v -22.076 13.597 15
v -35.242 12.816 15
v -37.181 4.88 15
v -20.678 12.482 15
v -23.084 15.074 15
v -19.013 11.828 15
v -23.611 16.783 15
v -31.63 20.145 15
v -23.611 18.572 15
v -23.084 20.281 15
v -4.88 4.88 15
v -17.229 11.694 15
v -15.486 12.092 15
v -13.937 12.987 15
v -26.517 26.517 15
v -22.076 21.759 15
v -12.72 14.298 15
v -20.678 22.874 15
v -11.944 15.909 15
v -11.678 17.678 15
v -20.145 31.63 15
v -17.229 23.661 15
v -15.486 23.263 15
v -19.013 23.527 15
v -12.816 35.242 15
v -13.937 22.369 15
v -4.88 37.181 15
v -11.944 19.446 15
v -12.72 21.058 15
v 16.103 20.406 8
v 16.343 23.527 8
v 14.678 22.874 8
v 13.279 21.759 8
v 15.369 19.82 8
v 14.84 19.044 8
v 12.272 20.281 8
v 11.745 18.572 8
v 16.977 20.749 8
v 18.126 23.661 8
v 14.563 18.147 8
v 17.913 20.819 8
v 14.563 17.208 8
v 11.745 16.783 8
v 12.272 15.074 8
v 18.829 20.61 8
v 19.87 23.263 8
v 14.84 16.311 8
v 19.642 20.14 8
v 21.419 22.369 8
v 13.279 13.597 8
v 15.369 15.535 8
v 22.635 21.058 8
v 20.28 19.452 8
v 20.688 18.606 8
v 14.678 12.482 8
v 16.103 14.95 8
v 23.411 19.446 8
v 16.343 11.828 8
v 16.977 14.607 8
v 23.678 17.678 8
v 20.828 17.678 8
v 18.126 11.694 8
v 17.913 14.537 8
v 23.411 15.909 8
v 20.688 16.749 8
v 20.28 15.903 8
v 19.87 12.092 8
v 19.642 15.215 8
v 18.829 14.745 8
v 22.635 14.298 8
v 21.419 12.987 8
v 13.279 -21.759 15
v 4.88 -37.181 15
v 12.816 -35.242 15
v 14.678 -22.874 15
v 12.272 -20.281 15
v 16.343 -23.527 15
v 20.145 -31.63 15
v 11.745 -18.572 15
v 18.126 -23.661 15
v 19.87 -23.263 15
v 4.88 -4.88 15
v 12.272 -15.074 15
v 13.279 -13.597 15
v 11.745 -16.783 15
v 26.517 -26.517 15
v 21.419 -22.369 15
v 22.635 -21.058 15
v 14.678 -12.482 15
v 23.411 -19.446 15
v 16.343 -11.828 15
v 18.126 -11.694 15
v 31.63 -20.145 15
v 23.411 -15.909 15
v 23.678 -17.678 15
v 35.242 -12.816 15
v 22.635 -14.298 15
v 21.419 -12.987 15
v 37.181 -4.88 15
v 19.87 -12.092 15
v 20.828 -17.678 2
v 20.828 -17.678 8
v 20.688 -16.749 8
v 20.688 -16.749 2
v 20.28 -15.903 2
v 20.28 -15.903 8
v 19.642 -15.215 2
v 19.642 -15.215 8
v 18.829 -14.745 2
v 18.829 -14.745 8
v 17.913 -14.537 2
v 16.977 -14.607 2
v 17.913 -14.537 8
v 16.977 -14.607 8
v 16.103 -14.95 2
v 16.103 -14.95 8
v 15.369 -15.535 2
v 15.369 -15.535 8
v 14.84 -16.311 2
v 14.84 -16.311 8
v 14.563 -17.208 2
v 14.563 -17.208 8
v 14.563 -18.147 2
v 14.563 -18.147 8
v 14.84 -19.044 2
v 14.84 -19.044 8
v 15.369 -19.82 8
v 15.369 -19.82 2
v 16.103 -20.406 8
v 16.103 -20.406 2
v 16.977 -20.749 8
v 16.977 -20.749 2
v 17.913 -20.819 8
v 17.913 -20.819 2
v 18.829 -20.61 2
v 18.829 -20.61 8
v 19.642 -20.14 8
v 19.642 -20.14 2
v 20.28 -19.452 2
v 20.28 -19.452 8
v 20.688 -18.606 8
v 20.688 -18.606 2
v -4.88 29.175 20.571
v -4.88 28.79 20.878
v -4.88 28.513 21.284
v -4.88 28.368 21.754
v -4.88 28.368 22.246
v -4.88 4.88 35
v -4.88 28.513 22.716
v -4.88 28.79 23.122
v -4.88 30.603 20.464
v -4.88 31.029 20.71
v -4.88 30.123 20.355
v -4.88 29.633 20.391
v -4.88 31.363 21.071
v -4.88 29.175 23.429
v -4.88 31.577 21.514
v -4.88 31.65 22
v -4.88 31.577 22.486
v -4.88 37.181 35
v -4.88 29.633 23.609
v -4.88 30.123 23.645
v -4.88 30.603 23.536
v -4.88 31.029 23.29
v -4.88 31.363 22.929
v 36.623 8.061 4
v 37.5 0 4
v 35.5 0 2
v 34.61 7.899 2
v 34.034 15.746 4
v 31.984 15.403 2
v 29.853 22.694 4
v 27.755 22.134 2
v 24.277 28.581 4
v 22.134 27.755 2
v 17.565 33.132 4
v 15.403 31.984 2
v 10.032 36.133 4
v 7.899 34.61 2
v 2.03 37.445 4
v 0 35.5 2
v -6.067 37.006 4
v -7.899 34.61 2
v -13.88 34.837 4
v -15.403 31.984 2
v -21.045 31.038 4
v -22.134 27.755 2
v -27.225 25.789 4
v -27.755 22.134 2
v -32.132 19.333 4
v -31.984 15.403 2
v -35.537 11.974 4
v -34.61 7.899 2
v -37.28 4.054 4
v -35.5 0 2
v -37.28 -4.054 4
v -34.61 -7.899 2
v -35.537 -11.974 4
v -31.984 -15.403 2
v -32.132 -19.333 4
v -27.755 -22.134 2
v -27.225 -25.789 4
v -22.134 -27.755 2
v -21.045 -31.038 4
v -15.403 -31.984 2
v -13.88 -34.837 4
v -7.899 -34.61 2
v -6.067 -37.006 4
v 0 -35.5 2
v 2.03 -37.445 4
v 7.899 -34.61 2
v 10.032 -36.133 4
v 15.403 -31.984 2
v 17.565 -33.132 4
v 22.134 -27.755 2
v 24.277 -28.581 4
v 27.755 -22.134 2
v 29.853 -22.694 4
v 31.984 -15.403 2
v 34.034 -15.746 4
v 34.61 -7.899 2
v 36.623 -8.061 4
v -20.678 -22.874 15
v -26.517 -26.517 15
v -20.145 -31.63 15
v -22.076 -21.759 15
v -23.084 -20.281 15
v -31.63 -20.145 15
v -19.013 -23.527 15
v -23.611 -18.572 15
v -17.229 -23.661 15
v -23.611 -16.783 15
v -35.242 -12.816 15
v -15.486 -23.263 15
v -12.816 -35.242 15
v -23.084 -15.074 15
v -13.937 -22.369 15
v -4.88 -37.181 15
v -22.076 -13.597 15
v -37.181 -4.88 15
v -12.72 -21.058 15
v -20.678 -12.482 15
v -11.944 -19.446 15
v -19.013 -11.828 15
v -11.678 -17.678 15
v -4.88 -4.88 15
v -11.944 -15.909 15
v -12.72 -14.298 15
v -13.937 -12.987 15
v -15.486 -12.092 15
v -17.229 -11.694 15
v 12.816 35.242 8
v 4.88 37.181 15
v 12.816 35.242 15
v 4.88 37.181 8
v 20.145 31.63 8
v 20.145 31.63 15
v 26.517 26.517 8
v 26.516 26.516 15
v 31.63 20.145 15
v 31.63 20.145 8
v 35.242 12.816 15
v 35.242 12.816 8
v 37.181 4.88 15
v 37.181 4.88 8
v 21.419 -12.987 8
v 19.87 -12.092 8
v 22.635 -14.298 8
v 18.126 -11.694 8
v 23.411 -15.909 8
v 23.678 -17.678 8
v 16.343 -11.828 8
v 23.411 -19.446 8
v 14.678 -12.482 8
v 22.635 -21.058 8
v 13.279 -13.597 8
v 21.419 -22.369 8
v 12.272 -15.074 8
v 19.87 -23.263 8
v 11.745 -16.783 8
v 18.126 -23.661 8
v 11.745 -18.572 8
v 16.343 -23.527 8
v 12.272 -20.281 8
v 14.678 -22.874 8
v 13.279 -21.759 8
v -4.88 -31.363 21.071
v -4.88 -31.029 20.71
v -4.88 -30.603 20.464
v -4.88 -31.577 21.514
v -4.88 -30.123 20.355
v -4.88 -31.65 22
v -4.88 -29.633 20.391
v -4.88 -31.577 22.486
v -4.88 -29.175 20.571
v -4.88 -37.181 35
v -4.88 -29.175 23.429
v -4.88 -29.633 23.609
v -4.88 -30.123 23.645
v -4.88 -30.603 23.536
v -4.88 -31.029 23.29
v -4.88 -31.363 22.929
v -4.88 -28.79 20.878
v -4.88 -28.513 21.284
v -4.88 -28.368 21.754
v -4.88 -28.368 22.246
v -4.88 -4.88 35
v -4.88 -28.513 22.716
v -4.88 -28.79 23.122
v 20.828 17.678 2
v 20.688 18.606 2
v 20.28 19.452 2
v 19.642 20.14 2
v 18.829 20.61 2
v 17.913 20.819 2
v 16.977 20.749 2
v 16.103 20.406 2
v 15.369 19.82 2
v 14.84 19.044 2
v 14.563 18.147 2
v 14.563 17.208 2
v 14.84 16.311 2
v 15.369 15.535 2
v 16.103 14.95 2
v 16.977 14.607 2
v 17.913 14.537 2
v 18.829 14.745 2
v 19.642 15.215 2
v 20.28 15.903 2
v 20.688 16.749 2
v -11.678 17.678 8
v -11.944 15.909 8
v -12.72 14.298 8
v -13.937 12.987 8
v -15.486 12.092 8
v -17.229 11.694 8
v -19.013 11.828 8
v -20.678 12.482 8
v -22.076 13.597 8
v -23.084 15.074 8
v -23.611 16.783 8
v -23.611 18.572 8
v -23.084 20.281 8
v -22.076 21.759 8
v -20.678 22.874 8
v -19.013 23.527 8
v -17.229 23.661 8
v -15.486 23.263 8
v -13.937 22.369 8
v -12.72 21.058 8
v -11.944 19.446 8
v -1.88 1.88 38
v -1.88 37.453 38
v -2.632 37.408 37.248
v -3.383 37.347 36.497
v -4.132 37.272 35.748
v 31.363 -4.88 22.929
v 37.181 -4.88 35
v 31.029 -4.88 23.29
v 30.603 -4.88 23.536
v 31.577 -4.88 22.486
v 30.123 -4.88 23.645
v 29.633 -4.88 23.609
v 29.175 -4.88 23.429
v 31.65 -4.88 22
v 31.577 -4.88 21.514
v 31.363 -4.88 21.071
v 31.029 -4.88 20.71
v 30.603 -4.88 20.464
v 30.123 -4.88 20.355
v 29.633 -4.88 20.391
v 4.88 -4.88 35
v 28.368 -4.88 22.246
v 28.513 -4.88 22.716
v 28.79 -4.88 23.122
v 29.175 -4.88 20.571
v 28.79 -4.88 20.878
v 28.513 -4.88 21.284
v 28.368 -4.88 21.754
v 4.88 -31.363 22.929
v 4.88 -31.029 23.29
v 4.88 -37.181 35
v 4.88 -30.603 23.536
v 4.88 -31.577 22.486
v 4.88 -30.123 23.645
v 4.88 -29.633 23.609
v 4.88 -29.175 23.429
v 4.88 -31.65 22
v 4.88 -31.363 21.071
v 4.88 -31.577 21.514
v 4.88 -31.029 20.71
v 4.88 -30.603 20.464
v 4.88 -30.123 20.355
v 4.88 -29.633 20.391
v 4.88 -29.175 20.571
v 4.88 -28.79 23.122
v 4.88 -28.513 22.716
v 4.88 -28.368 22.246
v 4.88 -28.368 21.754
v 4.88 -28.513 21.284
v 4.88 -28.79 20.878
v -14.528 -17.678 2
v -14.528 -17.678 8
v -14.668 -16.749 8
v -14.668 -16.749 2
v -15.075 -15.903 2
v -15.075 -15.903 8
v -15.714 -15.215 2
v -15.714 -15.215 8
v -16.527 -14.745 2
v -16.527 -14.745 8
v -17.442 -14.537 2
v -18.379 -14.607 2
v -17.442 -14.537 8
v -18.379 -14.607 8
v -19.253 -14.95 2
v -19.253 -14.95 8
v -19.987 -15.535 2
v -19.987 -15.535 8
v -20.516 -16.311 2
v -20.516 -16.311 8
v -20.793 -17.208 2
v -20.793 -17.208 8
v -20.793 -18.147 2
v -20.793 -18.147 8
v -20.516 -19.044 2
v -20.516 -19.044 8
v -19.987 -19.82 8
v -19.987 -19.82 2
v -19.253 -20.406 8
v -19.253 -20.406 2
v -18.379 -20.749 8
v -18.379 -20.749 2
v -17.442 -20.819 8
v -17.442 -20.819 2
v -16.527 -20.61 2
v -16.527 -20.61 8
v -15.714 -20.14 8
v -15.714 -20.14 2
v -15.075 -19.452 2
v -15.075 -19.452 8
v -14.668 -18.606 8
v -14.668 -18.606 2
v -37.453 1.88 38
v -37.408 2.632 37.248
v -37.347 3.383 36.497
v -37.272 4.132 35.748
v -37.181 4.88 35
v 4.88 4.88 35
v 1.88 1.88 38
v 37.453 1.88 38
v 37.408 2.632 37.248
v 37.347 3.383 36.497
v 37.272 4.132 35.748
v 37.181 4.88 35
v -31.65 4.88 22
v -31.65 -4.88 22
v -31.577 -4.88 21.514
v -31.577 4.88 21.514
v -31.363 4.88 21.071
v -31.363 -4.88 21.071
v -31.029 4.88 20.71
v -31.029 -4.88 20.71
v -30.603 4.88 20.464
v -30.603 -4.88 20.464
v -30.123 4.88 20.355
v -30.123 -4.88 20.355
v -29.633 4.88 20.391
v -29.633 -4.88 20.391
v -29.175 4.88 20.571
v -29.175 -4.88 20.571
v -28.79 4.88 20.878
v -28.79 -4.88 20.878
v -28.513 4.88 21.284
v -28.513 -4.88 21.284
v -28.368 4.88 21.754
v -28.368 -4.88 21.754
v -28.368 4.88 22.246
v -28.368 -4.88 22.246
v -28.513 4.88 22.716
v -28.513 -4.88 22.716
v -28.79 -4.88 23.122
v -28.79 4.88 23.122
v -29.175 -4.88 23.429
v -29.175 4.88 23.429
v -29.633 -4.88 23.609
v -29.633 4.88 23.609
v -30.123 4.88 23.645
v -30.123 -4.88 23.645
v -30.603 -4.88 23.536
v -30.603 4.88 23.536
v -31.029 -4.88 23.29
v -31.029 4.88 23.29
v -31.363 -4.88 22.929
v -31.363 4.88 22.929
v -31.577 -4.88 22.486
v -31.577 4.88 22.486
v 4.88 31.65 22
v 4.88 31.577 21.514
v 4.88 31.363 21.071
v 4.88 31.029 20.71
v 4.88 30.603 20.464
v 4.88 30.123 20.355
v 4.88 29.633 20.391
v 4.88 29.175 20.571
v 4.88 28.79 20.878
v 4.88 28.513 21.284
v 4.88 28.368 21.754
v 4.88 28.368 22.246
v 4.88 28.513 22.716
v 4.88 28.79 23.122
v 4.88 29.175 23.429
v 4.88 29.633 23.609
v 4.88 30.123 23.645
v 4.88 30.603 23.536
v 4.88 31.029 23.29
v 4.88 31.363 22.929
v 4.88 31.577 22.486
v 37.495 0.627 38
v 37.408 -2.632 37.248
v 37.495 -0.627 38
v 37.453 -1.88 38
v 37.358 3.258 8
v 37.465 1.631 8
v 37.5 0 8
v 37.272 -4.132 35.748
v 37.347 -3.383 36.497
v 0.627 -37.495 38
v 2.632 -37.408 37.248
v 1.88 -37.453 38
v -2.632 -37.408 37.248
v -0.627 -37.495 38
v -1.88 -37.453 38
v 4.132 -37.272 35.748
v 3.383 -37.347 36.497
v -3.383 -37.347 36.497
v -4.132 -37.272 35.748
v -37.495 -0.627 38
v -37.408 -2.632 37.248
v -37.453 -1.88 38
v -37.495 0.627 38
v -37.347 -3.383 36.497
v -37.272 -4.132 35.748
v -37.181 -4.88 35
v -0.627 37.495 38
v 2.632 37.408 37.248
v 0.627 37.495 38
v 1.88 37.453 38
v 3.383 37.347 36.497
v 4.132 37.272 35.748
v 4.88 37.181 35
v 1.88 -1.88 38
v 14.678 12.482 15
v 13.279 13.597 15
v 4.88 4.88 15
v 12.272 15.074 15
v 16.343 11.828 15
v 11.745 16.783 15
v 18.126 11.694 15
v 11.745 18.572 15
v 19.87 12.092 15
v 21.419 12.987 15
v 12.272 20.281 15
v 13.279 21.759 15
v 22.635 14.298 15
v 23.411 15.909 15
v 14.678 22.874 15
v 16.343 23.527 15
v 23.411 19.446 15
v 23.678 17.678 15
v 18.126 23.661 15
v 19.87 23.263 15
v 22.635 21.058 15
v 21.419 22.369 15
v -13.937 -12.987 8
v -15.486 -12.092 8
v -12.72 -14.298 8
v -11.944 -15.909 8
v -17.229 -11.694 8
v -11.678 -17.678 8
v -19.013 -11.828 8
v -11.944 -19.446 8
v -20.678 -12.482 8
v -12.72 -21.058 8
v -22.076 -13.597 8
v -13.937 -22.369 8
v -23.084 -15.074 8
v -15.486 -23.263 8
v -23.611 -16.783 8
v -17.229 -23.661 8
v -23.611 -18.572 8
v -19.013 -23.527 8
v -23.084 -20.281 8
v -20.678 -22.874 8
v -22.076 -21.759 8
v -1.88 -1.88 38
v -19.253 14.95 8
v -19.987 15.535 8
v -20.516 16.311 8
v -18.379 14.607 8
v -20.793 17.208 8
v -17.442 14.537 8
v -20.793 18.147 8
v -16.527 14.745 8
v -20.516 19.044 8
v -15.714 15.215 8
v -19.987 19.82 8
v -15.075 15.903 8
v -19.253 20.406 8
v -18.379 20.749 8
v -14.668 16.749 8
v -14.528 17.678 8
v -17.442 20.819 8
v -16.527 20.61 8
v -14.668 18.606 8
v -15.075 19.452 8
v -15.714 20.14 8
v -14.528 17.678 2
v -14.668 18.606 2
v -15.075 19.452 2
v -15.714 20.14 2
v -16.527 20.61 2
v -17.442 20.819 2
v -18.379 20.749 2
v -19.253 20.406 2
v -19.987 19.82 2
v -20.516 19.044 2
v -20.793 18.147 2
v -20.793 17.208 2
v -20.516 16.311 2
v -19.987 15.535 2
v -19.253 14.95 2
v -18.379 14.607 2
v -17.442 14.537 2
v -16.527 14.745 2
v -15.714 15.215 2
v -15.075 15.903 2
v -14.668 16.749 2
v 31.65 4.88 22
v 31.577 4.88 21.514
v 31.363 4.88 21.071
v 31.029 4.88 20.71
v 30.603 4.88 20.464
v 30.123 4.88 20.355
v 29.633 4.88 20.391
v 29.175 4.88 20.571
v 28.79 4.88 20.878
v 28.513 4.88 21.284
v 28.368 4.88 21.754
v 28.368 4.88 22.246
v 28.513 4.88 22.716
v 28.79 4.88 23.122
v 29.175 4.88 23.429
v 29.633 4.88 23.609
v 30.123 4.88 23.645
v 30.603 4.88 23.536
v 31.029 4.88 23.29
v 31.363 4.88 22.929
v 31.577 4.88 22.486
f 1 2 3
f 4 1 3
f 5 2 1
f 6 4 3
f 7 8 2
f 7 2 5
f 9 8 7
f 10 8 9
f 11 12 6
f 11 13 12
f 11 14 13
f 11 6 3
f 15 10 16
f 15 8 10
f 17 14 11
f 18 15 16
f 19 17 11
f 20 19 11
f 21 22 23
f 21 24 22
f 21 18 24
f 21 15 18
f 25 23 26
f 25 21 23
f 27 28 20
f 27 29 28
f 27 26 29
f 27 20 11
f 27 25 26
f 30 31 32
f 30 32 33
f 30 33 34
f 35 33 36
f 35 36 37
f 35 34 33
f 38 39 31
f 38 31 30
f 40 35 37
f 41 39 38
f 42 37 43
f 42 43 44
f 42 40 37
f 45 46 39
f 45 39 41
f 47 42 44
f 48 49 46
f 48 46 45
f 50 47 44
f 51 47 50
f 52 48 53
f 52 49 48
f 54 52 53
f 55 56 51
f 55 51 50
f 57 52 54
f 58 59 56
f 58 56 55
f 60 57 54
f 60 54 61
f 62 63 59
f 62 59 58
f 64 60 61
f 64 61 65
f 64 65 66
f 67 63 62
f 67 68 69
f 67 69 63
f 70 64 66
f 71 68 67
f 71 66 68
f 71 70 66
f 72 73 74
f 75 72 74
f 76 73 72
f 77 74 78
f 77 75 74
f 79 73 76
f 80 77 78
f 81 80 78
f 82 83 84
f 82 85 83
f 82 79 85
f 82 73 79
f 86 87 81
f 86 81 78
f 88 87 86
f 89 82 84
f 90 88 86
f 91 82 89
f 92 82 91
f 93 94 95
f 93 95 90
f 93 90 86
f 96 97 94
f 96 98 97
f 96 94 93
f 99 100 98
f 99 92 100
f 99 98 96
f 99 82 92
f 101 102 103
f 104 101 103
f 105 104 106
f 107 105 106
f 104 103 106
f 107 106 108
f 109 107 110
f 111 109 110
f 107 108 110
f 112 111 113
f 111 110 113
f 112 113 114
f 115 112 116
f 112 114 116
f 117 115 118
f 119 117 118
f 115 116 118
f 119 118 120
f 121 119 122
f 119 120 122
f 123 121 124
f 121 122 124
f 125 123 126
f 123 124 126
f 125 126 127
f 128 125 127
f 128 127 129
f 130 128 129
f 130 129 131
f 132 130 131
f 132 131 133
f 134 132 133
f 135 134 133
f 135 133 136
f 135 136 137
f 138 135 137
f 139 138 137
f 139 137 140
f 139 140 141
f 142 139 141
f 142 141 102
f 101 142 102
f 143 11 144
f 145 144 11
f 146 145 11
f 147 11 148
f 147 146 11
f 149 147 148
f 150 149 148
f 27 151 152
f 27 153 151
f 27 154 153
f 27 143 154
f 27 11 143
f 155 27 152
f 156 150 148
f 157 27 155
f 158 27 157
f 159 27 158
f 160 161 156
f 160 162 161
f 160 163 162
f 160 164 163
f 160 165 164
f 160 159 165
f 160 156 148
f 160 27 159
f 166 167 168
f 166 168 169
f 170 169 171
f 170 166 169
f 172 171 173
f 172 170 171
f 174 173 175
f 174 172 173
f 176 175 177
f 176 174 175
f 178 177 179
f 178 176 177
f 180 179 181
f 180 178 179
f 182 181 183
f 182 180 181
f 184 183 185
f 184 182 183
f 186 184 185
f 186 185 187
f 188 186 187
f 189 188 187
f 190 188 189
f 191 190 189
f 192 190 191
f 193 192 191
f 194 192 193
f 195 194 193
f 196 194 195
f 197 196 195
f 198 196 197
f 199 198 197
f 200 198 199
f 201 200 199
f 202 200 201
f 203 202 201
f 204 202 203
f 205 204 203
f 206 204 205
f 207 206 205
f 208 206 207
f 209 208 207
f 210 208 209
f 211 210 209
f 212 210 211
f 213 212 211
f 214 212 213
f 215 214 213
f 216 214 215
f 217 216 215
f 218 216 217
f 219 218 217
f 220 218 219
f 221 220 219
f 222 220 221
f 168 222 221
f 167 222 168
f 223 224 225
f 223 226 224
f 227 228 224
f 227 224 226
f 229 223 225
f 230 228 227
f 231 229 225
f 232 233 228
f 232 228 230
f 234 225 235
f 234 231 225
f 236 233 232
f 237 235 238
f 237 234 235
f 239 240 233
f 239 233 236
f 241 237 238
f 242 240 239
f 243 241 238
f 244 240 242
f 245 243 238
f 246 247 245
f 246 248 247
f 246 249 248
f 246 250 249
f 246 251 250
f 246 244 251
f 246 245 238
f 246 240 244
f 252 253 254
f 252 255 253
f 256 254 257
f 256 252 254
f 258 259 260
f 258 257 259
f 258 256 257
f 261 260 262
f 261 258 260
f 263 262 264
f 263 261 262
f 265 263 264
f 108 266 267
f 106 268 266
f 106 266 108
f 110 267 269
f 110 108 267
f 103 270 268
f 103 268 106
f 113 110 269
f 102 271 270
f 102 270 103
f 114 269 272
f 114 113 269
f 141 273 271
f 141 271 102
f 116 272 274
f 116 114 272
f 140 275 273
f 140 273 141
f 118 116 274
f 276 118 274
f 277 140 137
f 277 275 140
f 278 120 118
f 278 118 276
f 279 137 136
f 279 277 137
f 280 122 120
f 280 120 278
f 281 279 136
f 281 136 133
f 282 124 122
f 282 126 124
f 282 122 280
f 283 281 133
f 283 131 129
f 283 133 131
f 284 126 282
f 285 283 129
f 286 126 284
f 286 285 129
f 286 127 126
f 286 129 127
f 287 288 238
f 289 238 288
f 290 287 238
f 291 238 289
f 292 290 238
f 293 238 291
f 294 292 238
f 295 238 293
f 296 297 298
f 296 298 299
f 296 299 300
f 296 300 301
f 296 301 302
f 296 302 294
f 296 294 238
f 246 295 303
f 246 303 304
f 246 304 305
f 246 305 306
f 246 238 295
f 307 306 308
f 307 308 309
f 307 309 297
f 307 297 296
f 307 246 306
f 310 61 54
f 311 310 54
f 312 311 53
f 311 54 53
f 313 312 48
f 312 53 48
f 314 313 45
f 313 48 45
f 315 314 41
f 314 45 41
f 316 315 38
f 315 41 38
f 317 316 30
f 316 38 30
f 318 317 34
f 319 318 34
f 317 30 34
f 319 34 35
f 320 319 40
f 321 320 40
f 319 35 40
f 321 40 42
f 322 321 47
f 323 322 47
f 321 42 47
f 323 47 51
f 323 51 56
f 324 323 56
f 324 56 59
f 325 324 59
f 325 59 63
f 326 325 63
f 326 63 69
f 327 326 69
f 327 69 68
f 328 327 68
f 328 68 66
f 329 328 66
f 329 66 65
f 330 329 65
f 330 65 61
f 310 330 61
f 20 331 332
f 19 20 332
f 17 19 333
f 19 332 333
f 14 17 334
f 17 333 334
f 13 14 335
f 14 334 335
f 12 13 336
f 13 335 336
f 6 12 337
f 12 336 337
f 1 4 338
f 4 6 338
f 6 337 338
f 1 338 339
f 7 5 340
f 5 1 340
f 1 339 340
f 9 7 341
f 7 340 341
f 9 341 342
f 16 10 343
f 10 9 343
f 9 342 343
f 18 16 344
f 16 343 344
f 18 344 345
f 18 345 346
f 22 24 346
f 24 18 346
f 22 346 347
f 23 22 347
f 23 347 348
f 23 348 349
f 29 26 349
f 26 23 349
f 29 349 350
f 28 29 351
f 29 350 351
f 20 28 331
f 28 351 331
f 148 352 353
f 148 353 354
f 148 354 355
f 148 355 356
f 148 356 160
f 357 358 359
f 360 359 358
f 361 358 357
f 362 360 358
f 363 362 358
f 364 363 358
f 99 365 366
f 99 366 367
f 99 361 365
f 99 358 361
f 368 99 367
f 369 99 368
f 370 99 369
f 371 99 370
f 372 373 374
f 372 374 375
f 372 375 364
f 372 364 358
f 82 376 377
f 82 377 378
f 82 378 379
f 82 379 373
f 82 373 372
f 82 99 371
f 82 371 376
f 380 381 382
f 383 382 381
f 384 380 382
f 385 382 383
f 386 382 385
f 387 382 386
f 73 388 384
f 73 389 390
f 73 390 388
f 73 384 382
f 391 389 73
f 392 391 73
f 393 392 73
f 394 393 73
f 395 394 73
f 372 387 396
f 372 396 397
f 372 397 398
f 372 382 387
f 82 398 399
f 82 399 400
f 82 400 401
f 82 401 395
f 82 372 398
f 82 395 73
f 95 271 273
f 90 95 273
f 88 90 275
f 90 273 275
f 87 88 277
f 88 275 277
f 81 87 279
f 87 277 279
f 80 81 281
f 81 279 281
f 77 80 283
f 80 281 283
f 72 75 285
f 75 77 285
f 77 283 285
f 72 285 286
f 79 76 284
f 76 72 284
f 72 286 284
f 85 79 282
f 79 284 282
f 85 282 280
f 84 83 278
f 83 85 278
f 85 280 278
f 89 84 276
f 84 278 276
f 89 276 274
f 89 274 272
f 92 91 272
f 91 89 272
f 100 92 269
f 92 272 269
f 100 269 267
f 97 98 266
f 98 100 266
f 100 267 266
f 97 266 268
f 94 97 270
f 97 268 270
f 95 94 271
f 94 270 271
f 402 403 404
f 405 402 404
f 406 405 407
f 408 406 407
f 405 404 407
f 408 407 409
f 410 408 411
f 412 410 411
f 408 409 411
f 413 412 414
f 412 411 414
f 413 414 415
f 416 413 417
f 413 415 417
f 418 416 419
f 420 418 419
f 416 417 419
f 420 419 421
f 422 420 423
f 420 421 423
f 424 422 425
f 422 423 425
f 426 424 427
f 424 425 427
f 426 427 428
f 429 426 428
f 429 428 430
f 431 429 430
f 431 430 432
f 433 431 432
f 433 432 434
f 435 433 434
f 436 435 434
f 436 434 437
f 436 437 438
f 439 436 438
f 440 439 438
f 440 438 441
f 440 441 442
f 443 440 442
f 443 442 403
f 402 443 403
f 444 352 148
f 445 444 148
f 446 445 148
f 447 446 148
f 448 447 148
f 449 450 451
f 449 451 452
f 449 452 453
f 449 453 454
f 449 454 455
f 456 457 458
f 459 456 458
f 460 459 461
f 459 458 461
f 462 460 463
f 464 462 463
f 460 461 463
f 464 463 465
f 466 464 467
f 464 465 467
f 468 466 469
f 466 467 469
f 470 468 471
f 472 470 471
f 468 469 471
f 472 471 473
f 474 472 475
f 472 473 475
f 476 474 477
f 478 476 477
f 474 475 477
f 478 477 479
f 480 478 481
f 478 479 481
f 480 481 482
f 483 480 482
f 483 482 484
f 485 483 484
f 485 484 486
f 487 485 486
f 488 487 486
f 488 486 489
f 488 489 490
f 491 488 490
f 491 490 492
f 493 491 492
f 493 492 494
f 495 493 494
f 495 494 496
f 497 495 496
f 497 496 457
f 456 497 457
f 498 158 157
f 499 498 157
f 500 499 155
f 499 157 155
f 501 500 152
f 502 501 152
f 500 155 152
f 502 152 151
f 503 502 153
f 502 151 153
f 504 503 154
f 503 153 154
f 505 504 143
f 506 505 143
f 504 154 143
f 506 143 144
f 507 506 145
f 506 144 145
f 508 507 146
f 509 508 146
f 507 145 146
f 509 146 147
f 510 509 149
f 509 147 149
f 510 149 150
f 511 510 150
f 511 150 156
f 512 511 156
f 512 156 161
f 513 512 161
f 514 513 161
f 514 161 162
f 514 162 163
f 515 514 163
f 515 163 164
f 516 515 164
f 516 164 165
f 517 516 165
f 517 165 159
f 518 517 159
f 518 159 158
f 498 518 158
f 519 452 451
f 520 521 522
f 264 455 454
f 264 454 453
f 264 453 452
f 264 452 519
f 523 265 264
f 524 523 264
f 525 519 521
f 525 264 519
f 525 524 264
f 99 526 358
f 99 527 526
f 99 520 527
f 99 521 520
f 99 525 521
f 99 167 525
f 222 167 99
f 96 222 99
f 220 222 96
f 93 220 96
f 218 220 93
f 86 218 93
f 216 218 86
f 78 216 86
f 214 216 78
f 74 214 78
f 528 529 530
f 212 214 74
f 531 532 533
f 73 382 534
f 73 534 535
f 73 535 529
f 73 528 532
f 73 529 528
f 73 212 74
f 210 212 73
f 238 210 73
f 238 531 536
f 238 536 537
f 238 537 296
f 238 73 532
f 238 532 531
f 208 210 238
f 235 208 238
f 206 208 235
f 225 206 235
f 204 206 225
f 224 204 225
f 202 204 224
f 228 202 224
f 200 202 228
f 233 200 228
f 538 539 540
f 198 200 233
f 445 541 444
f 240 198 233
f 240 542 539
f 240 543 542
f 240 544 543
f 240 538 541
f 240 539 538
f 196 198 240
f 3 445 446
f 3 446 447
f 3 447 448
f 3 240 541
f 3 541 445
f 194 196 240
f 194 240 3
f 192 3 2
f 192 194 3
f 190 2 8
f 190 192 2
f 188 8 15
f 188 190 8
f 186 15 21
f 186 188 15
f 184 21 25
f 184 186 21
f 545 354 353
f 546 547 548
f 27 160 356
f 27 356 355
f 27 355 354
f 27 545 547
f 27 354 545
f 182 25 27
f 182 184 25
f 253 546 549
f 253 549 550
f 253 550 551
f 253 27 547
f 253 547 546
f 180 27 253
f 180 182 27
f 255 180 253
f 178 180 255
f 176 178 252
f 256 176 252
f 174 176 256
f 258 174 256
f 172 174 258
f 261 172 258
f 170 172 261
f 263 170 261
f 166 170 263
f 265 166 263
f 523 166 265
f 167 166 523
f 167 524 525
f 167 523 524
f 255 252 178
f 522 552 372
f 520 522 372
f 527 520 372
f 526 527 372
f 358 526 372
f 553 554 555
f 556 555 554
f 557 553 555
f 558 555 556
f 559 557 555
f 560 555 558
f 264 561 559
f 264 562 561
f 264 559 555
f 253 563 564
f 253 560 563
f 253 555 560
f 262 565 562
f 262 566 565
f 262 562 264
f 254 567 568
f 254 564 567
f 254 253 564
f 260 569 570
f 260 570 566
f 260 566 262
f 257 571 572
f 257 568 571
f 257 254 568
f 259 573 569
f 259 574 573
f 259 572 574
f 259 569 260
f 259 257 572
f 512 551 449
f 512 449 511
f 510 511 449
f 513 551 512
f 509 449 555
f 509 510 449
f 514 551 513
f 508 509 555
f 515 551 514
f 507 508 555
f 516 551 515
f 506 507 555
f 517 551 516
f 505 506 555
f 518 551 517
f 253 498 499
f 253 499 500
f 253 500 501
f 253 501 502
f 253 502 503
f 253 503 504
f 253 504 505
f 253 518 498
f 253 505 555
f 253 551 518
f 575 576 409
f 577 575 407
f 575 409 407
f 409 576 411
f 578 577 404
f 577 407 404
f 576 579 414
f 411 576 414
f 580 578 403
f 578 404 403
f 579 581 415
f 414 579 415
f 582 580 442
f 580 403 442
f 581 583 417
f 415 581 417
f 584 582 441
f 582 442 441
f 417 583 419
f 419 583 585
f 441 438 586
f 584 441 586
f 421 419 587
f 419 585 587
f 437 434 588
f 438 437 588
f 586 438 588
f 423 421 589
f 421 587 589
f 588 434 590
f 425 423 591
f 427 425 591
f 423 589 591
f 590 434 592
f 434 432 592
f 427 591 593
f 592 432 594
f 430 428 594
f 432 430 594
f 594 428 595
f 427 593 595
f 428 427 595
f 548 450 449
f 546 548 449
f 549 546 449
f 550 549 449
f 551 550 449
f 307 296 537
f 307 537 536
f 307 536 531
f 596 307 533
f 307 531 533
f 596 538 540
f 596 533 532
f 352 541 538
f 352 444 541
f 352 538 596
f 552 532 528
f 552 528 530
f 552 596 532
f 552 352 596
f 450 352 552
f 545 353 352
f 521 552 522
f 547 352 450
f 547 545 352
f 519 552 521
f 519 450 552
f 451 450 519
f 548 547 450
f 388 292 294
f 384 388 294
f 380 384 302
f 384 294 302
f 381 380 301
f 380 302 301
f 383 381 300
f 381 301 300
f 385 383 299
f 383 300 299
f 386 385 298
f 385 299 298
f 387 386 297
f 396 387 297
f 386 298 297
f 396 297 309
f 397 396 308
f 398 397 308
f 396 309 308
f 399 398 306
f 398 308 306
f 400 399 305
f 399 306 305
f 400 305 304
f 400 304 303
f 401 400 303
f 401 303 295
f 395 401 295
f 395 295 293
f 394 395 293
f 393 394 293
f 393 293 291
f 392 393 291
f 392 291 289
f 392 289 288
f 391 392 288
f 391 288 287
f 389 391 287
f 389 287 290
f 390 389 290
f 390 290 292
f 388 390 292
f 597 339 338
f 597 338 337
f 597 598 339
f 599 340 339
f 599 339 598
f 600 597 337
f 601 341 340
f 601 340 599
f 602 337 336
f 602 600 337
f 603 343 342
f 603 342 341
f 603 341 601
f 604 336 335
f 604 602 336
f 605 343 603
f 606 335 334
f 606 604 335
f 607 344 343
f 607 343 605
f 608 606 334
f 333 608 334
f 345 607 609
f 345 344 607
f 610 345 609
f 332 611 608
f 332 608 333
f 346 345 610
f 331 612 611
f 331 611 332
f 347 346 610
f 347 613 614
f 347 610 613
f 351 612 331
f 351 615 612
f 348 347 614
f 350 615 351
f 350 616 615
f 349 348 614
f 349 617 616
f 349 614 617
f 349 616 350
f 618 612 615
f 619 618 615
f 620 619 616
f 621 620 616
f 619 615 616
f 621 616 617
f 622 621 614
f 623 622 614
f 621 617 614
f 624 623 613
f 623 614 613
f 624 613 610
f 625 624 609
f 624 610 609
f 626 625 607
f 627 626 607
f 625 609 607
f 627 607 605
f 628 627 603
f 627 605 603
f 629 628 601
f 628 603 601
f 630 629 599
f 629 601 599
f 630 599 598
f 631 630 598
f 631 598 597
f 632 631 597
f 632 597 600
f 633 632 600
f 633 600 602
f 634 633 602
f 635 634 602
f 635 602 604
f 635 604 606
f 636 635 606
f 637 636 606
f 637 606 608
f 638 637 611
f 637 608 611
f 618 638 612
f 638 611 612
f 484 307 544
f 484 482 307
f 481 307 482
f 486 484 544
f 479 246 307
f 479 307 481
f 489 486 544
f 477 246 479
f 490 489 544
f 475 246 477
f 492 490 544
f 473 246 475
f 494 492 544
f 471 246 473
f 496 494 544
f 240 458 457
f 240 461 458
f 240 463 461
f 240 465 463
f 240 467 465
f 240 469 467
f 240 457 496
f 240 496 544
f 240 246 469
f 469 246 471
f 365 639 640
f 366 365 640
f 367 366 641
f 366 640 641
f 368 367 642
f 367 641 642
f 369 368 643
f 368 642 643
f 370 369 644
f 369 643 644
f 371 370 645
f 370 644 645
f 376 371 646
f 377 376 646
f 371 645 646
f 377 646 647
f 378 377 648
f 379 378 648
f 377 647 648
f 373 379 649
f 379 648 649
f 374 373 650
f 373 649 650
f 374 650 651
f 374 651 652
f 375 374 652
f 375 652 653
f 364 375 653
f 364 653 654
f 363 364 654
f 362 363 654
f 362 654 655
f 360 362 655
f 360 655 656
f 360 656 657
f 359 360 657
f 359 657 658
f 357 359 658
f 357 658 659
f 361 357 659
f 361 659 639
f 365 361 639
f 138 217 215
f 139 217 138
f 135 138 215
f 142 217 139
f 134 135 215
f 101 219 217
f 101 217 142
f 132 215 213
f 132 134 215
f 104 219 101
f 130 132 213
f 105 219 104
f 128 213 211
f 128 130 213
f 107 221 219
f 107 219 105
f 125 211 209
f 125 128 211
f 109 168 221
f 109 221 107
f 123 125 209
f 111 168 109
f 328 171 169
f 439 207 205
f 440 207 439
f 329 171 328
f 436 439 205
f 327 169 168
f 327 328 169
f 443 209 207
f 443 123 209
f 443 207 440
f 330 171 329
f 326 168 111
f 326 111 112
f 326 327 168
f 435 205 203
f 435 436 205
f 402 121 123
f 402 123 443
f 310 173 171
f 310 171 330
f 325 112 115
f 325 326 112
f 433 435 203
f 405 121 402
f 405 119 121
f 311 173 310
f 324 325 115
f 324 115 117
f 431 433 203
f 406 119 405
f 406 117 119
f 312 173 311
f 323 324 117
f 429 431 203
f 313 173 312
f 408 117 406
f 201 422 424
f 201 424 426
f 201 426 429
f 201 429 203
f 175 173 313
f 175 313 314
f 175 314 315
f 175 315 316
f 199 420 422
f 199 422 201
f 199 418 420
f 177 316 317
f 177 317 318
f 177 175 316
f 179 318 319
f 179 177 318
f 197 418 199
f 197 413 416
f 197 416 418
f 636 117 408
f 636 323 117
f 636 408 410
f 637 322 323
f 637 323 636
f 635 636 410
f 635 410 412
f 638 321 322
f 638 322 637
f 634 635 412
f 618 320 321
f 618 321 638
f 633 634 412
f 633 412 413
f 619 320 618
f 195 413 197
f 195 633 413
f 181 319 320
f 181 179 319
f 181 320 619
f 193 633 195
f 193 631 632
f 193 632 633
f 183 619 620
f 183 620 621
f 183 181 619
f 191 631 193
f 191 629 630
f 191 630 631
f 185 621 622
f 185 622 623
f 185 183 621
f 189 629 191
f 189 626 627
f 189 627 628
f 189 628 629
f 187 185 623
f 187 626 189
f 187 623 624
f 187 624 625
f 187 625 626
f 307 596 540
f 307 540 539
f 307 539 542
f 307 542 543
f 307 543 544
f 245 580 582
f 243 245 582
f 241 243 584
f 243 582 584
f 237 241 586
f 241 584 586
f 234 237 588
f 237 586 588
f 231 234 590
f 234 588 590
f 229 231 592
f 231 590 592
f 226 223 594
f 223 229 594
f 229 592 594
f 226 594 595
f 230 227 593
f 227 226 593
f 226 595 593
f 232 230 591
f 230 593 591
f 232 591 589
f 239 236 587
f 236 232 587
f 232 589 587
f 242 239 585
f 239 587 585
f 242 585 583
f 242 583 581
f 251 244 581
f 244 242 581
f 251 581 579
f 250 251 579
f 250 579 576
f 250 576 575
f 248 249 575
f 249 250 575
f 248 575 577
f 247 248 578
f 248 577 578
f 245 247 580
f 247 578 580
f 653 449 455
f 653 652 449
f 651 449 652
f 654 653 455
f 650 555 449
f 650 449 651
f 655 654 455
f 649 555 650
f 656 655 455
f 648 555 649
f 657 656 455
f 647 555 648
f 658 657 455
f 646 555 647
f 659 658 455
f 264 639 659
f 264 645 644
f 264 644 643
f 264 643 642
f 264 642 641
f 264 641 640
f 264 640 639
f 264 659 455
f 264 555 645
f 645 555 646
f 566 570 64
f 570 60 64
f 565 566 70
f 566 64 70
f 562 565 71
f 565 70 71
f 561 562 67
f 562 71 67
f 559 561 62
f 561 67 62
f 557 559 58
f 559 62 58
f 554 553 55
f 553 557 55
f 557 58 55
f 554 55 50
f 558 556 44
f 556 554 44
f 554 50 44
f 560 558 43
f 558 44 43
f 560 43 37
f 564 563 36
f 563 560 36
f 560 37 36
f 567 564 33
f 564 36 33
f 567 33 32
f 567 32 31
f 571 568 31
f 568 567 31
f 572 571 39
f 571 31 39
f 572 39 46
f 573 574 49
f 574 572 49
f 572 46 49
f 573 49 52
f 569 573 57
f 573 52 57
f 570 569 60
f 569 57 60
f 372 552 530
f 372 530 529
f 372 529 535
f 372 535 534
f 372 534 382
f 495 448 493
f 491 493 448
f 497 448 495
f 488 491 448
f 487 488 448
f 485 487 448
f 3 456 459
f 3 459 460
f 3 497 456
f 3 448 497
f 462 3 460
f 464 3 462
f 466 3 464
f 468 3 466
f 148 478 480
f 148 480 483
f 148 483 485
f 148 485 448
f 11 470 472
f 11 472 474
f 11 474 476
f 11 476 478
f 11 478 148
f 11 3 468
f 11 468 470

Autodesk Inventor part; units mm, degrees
ref_plane "YZ Plane" through (0, 0, 0) normal (1, 0, 0) x (0, 1, 0)
ref_plane "XZ Plane" through (0, 0, 0) normal (0, 1, 0) x (-1, 0, 0)
ref_plane "XY Plane" through (0, 0, 0) normal (0, 0, 1) x (1, 0, 0)
sketch "Sketch1" plane through (0, 0, 0) normal (0, 0, 1) x (1, 0, 0)
  circle A0 centre (0, 0) radius 37.5
  line L0 (0, 0) -> (0, -25)
  circle A1 centre (0, -25) radius 3
  dimension "d0" = 75
  dimension "d1" = 25
  dimension "d2" = 6
extrude "Extrusion1" add sketch "Sketch1" along normal blind 8 contours A0 | A1
sketch "Sketch2" plane through (0, 0, 8) normal (0, 0, 1) x (1, 0, 0)
  line L0 (0, 0) -> (17.6777, 17.6777)
  line L1 (0, 0) -> (25, 0) construction
  circle A0 centre (17.6777, 17.6777) radius 3.15
  circle A1 centre (-17.6777, 17.6777) radius 3.15
  circle A2 centre (-17.6777, -17.6777) radius 3.15
  circle A3 centre (17.6777, -17.6777) radius 3.15
  dimension "d5" = 25
  dimension "d6" = 45
  dimension "d7" = 6.3
  dimension "d10" = 360
extrude "Extrusion2" cut sketch "Sketch2" against normal blind 10
sketch "Sketch3" plane through (0, 0, 8) normal (0, 0, 1) x (1, 0, 0)
  arc A0 (-21.9203, 13.435) -> (-13.435, 21.9203) centre (-17.6777, 17.6777) ccw
  line L0 (-17.6777, 17.6777) -> (-11.6777, 17.6777) construction
  line L1 (-13.435, 21.9203) -> (-19.9189, 28.4042)
  line L2 (-21.9203, 13.435) -> (-28.4042, 19.9189)
  line L3 (-28.4042, 19.9189) -> (-19.9189, 28.4042)
  arc A1 (-13.435, -21.9203) -> (-21.9203, -13.435) centre (-17.6777, -17.6777) ccw
  line L4 (-17.6777, -17.6777) -> (-17.6777, -11.6777) construction
  line L5 (-21.9203, -13.435) -> (-28.4042, -19.9189)
  line L6 (-13.435, -21.9203) -> (-19.9189, -28.4042)
  line L7 (-19.9189, -28.4042) -> (-28.4042, -19.9189)
  arc A2 (21.9203, -13.435) -> (13.435, -21.9203) centre (17.6777, -17.6777) ccw
  line L8 (17.6777, -17.6777) -> (11.6777, -17.6777) construction
  line L9 (13.435, -21.9203) -> (19.9189, -28.4042)
  line L10 (21.9203, -13.435) -> (28.4042, -19.9189)
  line L11 (28.4042, -19.9189) -> (19.9189, -28.4042)
  arc A3 (13.435, 21.9203) -> (21.9203, 13.435) centre (17.6777, 17.6777) ccw
  line L12 (17.6777, 17.6777) -> (17.6777, 11.6777) construction
  line L13 (21.9203, 13.435) -> (28.4042, 19.9189)
  line L14 (13.435, 21.9203) -> (19.9189, 28.4042)
  line L15 (19.9189, 28.4042) -> (28.4042, 19.9189)
  circle A4 centre (0, 0) radius 31.5
  point P0 (-26.1087, 17.6234)
  point P1 (-26.1087, -17.6234)
  point P2 (-17.6234, -26.1087)
  point P3 (17.6234, -26.1087)
  point P4 (26.1087, -17.6234)
  point P5 (26.1087, 17.6234)
  point P6 (17.6234, 26.1087)
  point P7 (-17.6234, 26.1087)
  dimension "d14" = 12
  dimension "d18" = 360
sketch "Sketch4" plane through (0, 0, 0) normal (0, 0, -1) x (-1, 0, 0)
  circle A0 centre (0, 0) radius 42.8826
extrude "Extrusion4" cut sketch "Sketch4" against normal blind 2
sketch "Sketch5" plane through (0, 0, 8) normal (0, 0, 1) x (1, 0, 0)
  line L0 (0, 0) -> (8, 0)
  line L1 (8, 0) -> (8, -40)
  line L2 (8, -40) -> (-8, -40)
  line L3 (-8, -40) -> (-8, 40)
  line L4 (-8, 40) -> (8, 40)
  line L5 (8, 40) -> (8, -40)
  line L6 (0, 0) -> (0, 8)
  line L7 (0, 8) -> (40, 8)
  line L8 (40, 8) -> (40, -8)
  line L9 (40, -8) -> (-40, -8)
  line L10 (-40, -8) -> (-40, 8)
  line L11 (-40, 8) -> (40, 8)
  line L12 (0, 0) -> (0, 40)
  line L13 (0, 40) -> (-5, 40)
  line L14 (-5, 40) -> (5, 40)
  line L15 (5, 40) -> (5, -40)
  line L16 (5, -40) -> (-5, -40)
  line L17 (-5, -40) -> (-5, 40)
  point P0 (8, -8)
  point P1 (8, 8)
  point P2 (-8, 8)
  point P3 (-8, -8)
  dimension "d24" = 8
  dimension "d25" = 40
  dimension "d26" = 16
  dimension "d27" = 80
  dimension "d30" = 90
  dimension "d34" = 5
  dimension "d35" = 10
sketch "Sketch6" plane through (0, 0, 8) normal (0, 0, 1) x (1, 0, 0)
  line L0 (0, 0) -> (0, 40)
  line L1 (0, 40) -> (-5, 40)
  line L2 (-5, 40) -> (5, 40)
  line L3 (5, 40) -> (5, -40)
  line L4 (5, -40) -> (-5, -40)
  line L5 (-5, -40) -> (-5, 40)
  line L6 (0, 0) -> (-40, 0)
  line L7 (-40, 0) -> (-40, -5)
  line L8 (-40, -5) -> (-40, 5)
  line L9 (-40, 5) -> (40, 5)
  line L10 (40, 5) -> (40, -5)
  line L11 (40, -5) -> (-40, -5)
  circle A0 centre (0, 0) radius 37.5
  point P0 (5, -5)
  point P1 (5, 5)
  point P2 (-5, 5)
  point P3 (-5, -5)
  point P4 (37.1652, 5)
  point P5 (5, 37.1652)
  point P6 (-5, 37.1652)
  point P7 (-37.1652, 5)
  point P8 (-37.1652, -5)
  point P9 (-5, -37.1652)
  point P10 (5, -37.1652)
  point P11 (37.1652, -5)
  dimension "d36" = 40
  dimension "d37" = 5
  dimension "d38" = 10
  dimension "d39" = 80
  dimension "d42" = 90
  dimension "d46" = 75
extrude "Extrusion7" add sketch "Sketch6" along normal blind 30 contours L6 L5 L9 L0 | L0 L9 L3 L11 L5 L6 | L9 L5 A0 L0 | L0 A0 L3 L9 | L6 A0 L9 L5 | L5 L11 A0 L6 | L9 A0 L11 L3 | L11 L3 A0 L5
sketch "Sketch7" plane through (5, 5, 8) normal (0, 1, 0) x (1, 0, 0)
  line L0 (0, 0) -> (0, -30) projected
  line L1 (0, 0) -> (-5, 0)
  line L2 (-5, 0) -> (25, 0)
  line L3 (0, 0) -> (32.1652, 0) projected
  line L4 (25, 0) -> (25, -14)
  circle A0 centre (25, -14) radius 1.65
  point P0 (-5, 8)
  dimension "d49" = 5
  dimension "d50" = 30
  dimension "d51" = 14
  dimension "d52" = 3.3
extrude "Extrusion8" cut sketch "Sketch7" against normal blind 20
ref_plane "Work Plane1" through (5, 0, 8) normal (0, 1, 0) x (1, 0, 0)
ref_plane "Work Plane2" through (0, 5, 8) normal (1, 0, 0) x (0, 0, -1)
pattern_circular "Circular Pattern2" count 2 over 90 about axis through (0, 0, 8) along (0, 0, 1) of "Extrusion8"
sketch "Sketch8" plane through (-37.1652, 5, 8) normal (0, 1, 0) x (1, 0, 0)
  line L0 (32.1652, 0) -> (32.1652, -30) projected
  line L1 (32.1652, 0) -> (37.1652, 0)
  line L2 (37.1652, 0) -> (5.9902, 0)
  line L3 (22.6375, 0) -> (16.3375, 0) projected
  line L4 (5.9902, 0) -> (5.9902, -14)
  circle A0 centre (5.9902, -14) radius 2.15
  point P0 (37.1652, 8)
  dimension "d61" = 31.175
  dimension "d62" = 14
  dimension "d63" = 4.3
extrude "Extrusion9" [suppressed]
pattern_circular "Circular Pattern3" count 2 over 360 about axis through (0, 0, 8) along (0, 0, -1) of "Extrusion8"
chamfer "Chamfer1" distance 2 angle 45 1 edges at (-37.5, 0, 2)
sketch "Sketch10" plane through (5, 5, 8) normal (1, 0, 0) x (0, 0, -1)
  line L0 (0, 0) -> (-30, 0) projected
  line L1 (0, 0) -> (-30, 0)
  line L2 (-30, 0) -> (-30, 35.3175)
  line L3 (-30, 35.3175) -> (0, 35.3175)
  line L4 (0, 35.3175) -> (0, 0)
  line L5 (0, -10) -> (-30, -10) projected
  line L6 (0, -10) -> (-32.3439, -10)
  line L7 (-32.3439, -10) -> (-32.3439, -45.8466)
  line L8 (-32.3439, -45.8466) -> (0, -45.8466)
  line L9 (0, -45.8466) -> (0, -10)
  point P0 (8, -5)
extrude "Extrusion11" cut sketch "Sketch10" against normal blind 0.12
mirror "Mirror2" about plane through (0, 5, 8) normal (1, 0, 0) of "Extrusion11"
sketch "Sketch11" plane through (37.1652, 5, 38) normal (0, 1, 0) x (1, 0, 0)
  line L0 (-32.2852, 30) -> (-32.2852, 0) projected
  line L1 (-32.2852, 30) -> (5.1404, 30)
  line L2 (5.1404, 30) -> (5.1404, -1.2125)
  line L3 (5.1404, -1.2125) -> (-32.2852, -1.2125)
  line L4 (-32.2852, -1.2125) -> (-32.2852, 30)
  line L5 (-74.3303, 30) -> (-42.0452, 30) projected
  line L6 (-42.0452, 30) -> (-76.613, 30)
  line L7 (-76.613, 30) -> (-76.613, -1.2125)
  line L8 (-76.613, -1.2125) -> (-42.0452, -1.2125)
  line L9 (-42.0452, -1.2125) -> (-42.0452, 30)
  point P0 (-37.1652, 38)
extrude "Extrusion12" cut sketch "Sketch11" against normal blind 0.12
mirror "Mirror3" about plane through (5, 0, 8) normal (0, 1, 0) of "Extrusion12"
mirror "Mirror4" about plane through (5, 0, 8) normal (0, 1, 0) of "Extrusion8", "Circular Pattern2"
chamfer "Chamfer4" distance 3 angle 45 8 edges at (21.0306, 4.88, 38) (-21.0306, 4.88, 38) (4.88, -21.0306, 38) (4.88, 21.0306, 38) (-4.88, -21.0306, 38) (-4.88, 21.0306, 38) (21.0306, -4.88, 38) (-21.0306, -4.88, 38)
sketch "Sketch13" plane through (0, 0, 8) normal (0, 0, 1) x (1, 0, 0)
  arc A0 (37.1811, 4.88) -> (4.88, 37.1811) centre (0, 0) ccw projected
  circle A1 centre (0, 0) radius 37.5
  line L0 (37.1811, 4.88) -> (4.88, 4.88) projected
  line L1 (4.88, 4.88) -> (4.88, 37.1811) projected
  line L2 (37.1811, 4.88) -> (4.88, 4.88)
  line L3 (4.88, 4.88) -> (4.88, 37.1811)
  line L4 (4.88, 37.1811) -> (37.1811, 37.1811)
  line L5 (37.1811, 37.1811) -> (37.1811, 4.88)
  circle A2 centre (17.6777, 17.6777) radius 3.15 projected
  circle A3 centre (17.6777, 17.6777) radius 6
  line L6 (0, 0) -> (0, 7.2893)
  line L7 (0, 0) -> (7.7636, 0)
  arc A4 (-4.88, 37.1811) -> (-37.1811, 4.88) centre (0, 0) ccw
  circle A5 centre (0, 0) radius 37.5
  line L8 (-37.1811, 4.88) -> (-4.88, 4.88)
  line L9 (-4.88, 4.88) -> (-4.88, 37.1811)
  line L10 (-37.1811, 4.88) -> (-4.88, 4.88)
  line L11 (-4.88, 4.88) -> (-4.88, 37.1811)
  line L12 (-4.88, 37.1811) -> (-37.1811, 37.1811)
  line L13 (-37.1811, 37.1811) -> (-37.1811, 4.88)
  circle A6 centre (-17.6777, 17.6777) radius 3.15
  circle A7 centre (-17.6777, 17.6777) radius 6
  arc A8 (4.88, -37.1811) -> (37.1811, -4.88) centre (0, 0) ccw
  circle A9 centre (0, 0) radius 37.5
  line L14 (37.1811, -4.88) -> (4.88, -4.88)
  line L15 (4.88, -4.88) -> (4.88, -37.1811)
  line L16 (37.1811, -4.88) -> (4.88, -4.88)
  line L17 (4.88, -4.88) -> (4.88, -37.1811)
  line L18 (4.88, -37.1811) -> (37.1811, -37.1811)
  line L19 (37.1811, -37.1811) -> (37.1811, -4.88)
  circle A10 centre (17.6777, -17.6777) radius 3.15
  circle A11 centre (17.6777, -17.6777) radius 6
  line L20 (0, 0) -> (0, -7.2893)
  arc A12 (-37.1811, -4.88) -> (-4.88, -37.1811) centre (0, 0) ccw
  circle A13 centre (0, 0) radius 37.5
  line L21 (-37.1811, -4.88) -> (-4.88, -4.88)
  line L22 (-4.88, -4.88) -> (-4.88, -37.1811)
  line L23 (-37.1811, -4.88) -> (-4.88, -4.88)
  line L24 (-4.88, -4.88) -> (-4.88, -37.1811)
  line L25 (-4.88, -37.1811) -> (-37.1811, -37.1811)
  line L26 (-37.1811, -37.1811) -> (-37.1811, -4.88)
  circle A14 centre (-17.6777, -17.6777) radius 3.15
  circle A15 centre (-17.6777, -17.6777) radius 6
  arc A16 (1.88, 37.4528) -> (-1.88, 37.4528) centre (0, 0) ccw projected
  line L27 (1.88, 37.4528) -> (-1.88, 37.4528)
  line L28 (4.88, 37.1811) -> (17.88, 37.1811)
  line L29 (4.88, 37.1811) -> (4.88, 24.0161)
  point P0 (-37.1811, -4.88)
  dimension "d96" = 12
  dimension "d97" = 13
  dimension "d98" = 13.165
extrude "Extrusion14" add sketch "Sketch13" along normal blind 7 contours L0 L1 A0 | A1 L15 L14 | L9 L8 A1 | A1 L21 L22
properties part number "UR5_Mounting_Plate"
